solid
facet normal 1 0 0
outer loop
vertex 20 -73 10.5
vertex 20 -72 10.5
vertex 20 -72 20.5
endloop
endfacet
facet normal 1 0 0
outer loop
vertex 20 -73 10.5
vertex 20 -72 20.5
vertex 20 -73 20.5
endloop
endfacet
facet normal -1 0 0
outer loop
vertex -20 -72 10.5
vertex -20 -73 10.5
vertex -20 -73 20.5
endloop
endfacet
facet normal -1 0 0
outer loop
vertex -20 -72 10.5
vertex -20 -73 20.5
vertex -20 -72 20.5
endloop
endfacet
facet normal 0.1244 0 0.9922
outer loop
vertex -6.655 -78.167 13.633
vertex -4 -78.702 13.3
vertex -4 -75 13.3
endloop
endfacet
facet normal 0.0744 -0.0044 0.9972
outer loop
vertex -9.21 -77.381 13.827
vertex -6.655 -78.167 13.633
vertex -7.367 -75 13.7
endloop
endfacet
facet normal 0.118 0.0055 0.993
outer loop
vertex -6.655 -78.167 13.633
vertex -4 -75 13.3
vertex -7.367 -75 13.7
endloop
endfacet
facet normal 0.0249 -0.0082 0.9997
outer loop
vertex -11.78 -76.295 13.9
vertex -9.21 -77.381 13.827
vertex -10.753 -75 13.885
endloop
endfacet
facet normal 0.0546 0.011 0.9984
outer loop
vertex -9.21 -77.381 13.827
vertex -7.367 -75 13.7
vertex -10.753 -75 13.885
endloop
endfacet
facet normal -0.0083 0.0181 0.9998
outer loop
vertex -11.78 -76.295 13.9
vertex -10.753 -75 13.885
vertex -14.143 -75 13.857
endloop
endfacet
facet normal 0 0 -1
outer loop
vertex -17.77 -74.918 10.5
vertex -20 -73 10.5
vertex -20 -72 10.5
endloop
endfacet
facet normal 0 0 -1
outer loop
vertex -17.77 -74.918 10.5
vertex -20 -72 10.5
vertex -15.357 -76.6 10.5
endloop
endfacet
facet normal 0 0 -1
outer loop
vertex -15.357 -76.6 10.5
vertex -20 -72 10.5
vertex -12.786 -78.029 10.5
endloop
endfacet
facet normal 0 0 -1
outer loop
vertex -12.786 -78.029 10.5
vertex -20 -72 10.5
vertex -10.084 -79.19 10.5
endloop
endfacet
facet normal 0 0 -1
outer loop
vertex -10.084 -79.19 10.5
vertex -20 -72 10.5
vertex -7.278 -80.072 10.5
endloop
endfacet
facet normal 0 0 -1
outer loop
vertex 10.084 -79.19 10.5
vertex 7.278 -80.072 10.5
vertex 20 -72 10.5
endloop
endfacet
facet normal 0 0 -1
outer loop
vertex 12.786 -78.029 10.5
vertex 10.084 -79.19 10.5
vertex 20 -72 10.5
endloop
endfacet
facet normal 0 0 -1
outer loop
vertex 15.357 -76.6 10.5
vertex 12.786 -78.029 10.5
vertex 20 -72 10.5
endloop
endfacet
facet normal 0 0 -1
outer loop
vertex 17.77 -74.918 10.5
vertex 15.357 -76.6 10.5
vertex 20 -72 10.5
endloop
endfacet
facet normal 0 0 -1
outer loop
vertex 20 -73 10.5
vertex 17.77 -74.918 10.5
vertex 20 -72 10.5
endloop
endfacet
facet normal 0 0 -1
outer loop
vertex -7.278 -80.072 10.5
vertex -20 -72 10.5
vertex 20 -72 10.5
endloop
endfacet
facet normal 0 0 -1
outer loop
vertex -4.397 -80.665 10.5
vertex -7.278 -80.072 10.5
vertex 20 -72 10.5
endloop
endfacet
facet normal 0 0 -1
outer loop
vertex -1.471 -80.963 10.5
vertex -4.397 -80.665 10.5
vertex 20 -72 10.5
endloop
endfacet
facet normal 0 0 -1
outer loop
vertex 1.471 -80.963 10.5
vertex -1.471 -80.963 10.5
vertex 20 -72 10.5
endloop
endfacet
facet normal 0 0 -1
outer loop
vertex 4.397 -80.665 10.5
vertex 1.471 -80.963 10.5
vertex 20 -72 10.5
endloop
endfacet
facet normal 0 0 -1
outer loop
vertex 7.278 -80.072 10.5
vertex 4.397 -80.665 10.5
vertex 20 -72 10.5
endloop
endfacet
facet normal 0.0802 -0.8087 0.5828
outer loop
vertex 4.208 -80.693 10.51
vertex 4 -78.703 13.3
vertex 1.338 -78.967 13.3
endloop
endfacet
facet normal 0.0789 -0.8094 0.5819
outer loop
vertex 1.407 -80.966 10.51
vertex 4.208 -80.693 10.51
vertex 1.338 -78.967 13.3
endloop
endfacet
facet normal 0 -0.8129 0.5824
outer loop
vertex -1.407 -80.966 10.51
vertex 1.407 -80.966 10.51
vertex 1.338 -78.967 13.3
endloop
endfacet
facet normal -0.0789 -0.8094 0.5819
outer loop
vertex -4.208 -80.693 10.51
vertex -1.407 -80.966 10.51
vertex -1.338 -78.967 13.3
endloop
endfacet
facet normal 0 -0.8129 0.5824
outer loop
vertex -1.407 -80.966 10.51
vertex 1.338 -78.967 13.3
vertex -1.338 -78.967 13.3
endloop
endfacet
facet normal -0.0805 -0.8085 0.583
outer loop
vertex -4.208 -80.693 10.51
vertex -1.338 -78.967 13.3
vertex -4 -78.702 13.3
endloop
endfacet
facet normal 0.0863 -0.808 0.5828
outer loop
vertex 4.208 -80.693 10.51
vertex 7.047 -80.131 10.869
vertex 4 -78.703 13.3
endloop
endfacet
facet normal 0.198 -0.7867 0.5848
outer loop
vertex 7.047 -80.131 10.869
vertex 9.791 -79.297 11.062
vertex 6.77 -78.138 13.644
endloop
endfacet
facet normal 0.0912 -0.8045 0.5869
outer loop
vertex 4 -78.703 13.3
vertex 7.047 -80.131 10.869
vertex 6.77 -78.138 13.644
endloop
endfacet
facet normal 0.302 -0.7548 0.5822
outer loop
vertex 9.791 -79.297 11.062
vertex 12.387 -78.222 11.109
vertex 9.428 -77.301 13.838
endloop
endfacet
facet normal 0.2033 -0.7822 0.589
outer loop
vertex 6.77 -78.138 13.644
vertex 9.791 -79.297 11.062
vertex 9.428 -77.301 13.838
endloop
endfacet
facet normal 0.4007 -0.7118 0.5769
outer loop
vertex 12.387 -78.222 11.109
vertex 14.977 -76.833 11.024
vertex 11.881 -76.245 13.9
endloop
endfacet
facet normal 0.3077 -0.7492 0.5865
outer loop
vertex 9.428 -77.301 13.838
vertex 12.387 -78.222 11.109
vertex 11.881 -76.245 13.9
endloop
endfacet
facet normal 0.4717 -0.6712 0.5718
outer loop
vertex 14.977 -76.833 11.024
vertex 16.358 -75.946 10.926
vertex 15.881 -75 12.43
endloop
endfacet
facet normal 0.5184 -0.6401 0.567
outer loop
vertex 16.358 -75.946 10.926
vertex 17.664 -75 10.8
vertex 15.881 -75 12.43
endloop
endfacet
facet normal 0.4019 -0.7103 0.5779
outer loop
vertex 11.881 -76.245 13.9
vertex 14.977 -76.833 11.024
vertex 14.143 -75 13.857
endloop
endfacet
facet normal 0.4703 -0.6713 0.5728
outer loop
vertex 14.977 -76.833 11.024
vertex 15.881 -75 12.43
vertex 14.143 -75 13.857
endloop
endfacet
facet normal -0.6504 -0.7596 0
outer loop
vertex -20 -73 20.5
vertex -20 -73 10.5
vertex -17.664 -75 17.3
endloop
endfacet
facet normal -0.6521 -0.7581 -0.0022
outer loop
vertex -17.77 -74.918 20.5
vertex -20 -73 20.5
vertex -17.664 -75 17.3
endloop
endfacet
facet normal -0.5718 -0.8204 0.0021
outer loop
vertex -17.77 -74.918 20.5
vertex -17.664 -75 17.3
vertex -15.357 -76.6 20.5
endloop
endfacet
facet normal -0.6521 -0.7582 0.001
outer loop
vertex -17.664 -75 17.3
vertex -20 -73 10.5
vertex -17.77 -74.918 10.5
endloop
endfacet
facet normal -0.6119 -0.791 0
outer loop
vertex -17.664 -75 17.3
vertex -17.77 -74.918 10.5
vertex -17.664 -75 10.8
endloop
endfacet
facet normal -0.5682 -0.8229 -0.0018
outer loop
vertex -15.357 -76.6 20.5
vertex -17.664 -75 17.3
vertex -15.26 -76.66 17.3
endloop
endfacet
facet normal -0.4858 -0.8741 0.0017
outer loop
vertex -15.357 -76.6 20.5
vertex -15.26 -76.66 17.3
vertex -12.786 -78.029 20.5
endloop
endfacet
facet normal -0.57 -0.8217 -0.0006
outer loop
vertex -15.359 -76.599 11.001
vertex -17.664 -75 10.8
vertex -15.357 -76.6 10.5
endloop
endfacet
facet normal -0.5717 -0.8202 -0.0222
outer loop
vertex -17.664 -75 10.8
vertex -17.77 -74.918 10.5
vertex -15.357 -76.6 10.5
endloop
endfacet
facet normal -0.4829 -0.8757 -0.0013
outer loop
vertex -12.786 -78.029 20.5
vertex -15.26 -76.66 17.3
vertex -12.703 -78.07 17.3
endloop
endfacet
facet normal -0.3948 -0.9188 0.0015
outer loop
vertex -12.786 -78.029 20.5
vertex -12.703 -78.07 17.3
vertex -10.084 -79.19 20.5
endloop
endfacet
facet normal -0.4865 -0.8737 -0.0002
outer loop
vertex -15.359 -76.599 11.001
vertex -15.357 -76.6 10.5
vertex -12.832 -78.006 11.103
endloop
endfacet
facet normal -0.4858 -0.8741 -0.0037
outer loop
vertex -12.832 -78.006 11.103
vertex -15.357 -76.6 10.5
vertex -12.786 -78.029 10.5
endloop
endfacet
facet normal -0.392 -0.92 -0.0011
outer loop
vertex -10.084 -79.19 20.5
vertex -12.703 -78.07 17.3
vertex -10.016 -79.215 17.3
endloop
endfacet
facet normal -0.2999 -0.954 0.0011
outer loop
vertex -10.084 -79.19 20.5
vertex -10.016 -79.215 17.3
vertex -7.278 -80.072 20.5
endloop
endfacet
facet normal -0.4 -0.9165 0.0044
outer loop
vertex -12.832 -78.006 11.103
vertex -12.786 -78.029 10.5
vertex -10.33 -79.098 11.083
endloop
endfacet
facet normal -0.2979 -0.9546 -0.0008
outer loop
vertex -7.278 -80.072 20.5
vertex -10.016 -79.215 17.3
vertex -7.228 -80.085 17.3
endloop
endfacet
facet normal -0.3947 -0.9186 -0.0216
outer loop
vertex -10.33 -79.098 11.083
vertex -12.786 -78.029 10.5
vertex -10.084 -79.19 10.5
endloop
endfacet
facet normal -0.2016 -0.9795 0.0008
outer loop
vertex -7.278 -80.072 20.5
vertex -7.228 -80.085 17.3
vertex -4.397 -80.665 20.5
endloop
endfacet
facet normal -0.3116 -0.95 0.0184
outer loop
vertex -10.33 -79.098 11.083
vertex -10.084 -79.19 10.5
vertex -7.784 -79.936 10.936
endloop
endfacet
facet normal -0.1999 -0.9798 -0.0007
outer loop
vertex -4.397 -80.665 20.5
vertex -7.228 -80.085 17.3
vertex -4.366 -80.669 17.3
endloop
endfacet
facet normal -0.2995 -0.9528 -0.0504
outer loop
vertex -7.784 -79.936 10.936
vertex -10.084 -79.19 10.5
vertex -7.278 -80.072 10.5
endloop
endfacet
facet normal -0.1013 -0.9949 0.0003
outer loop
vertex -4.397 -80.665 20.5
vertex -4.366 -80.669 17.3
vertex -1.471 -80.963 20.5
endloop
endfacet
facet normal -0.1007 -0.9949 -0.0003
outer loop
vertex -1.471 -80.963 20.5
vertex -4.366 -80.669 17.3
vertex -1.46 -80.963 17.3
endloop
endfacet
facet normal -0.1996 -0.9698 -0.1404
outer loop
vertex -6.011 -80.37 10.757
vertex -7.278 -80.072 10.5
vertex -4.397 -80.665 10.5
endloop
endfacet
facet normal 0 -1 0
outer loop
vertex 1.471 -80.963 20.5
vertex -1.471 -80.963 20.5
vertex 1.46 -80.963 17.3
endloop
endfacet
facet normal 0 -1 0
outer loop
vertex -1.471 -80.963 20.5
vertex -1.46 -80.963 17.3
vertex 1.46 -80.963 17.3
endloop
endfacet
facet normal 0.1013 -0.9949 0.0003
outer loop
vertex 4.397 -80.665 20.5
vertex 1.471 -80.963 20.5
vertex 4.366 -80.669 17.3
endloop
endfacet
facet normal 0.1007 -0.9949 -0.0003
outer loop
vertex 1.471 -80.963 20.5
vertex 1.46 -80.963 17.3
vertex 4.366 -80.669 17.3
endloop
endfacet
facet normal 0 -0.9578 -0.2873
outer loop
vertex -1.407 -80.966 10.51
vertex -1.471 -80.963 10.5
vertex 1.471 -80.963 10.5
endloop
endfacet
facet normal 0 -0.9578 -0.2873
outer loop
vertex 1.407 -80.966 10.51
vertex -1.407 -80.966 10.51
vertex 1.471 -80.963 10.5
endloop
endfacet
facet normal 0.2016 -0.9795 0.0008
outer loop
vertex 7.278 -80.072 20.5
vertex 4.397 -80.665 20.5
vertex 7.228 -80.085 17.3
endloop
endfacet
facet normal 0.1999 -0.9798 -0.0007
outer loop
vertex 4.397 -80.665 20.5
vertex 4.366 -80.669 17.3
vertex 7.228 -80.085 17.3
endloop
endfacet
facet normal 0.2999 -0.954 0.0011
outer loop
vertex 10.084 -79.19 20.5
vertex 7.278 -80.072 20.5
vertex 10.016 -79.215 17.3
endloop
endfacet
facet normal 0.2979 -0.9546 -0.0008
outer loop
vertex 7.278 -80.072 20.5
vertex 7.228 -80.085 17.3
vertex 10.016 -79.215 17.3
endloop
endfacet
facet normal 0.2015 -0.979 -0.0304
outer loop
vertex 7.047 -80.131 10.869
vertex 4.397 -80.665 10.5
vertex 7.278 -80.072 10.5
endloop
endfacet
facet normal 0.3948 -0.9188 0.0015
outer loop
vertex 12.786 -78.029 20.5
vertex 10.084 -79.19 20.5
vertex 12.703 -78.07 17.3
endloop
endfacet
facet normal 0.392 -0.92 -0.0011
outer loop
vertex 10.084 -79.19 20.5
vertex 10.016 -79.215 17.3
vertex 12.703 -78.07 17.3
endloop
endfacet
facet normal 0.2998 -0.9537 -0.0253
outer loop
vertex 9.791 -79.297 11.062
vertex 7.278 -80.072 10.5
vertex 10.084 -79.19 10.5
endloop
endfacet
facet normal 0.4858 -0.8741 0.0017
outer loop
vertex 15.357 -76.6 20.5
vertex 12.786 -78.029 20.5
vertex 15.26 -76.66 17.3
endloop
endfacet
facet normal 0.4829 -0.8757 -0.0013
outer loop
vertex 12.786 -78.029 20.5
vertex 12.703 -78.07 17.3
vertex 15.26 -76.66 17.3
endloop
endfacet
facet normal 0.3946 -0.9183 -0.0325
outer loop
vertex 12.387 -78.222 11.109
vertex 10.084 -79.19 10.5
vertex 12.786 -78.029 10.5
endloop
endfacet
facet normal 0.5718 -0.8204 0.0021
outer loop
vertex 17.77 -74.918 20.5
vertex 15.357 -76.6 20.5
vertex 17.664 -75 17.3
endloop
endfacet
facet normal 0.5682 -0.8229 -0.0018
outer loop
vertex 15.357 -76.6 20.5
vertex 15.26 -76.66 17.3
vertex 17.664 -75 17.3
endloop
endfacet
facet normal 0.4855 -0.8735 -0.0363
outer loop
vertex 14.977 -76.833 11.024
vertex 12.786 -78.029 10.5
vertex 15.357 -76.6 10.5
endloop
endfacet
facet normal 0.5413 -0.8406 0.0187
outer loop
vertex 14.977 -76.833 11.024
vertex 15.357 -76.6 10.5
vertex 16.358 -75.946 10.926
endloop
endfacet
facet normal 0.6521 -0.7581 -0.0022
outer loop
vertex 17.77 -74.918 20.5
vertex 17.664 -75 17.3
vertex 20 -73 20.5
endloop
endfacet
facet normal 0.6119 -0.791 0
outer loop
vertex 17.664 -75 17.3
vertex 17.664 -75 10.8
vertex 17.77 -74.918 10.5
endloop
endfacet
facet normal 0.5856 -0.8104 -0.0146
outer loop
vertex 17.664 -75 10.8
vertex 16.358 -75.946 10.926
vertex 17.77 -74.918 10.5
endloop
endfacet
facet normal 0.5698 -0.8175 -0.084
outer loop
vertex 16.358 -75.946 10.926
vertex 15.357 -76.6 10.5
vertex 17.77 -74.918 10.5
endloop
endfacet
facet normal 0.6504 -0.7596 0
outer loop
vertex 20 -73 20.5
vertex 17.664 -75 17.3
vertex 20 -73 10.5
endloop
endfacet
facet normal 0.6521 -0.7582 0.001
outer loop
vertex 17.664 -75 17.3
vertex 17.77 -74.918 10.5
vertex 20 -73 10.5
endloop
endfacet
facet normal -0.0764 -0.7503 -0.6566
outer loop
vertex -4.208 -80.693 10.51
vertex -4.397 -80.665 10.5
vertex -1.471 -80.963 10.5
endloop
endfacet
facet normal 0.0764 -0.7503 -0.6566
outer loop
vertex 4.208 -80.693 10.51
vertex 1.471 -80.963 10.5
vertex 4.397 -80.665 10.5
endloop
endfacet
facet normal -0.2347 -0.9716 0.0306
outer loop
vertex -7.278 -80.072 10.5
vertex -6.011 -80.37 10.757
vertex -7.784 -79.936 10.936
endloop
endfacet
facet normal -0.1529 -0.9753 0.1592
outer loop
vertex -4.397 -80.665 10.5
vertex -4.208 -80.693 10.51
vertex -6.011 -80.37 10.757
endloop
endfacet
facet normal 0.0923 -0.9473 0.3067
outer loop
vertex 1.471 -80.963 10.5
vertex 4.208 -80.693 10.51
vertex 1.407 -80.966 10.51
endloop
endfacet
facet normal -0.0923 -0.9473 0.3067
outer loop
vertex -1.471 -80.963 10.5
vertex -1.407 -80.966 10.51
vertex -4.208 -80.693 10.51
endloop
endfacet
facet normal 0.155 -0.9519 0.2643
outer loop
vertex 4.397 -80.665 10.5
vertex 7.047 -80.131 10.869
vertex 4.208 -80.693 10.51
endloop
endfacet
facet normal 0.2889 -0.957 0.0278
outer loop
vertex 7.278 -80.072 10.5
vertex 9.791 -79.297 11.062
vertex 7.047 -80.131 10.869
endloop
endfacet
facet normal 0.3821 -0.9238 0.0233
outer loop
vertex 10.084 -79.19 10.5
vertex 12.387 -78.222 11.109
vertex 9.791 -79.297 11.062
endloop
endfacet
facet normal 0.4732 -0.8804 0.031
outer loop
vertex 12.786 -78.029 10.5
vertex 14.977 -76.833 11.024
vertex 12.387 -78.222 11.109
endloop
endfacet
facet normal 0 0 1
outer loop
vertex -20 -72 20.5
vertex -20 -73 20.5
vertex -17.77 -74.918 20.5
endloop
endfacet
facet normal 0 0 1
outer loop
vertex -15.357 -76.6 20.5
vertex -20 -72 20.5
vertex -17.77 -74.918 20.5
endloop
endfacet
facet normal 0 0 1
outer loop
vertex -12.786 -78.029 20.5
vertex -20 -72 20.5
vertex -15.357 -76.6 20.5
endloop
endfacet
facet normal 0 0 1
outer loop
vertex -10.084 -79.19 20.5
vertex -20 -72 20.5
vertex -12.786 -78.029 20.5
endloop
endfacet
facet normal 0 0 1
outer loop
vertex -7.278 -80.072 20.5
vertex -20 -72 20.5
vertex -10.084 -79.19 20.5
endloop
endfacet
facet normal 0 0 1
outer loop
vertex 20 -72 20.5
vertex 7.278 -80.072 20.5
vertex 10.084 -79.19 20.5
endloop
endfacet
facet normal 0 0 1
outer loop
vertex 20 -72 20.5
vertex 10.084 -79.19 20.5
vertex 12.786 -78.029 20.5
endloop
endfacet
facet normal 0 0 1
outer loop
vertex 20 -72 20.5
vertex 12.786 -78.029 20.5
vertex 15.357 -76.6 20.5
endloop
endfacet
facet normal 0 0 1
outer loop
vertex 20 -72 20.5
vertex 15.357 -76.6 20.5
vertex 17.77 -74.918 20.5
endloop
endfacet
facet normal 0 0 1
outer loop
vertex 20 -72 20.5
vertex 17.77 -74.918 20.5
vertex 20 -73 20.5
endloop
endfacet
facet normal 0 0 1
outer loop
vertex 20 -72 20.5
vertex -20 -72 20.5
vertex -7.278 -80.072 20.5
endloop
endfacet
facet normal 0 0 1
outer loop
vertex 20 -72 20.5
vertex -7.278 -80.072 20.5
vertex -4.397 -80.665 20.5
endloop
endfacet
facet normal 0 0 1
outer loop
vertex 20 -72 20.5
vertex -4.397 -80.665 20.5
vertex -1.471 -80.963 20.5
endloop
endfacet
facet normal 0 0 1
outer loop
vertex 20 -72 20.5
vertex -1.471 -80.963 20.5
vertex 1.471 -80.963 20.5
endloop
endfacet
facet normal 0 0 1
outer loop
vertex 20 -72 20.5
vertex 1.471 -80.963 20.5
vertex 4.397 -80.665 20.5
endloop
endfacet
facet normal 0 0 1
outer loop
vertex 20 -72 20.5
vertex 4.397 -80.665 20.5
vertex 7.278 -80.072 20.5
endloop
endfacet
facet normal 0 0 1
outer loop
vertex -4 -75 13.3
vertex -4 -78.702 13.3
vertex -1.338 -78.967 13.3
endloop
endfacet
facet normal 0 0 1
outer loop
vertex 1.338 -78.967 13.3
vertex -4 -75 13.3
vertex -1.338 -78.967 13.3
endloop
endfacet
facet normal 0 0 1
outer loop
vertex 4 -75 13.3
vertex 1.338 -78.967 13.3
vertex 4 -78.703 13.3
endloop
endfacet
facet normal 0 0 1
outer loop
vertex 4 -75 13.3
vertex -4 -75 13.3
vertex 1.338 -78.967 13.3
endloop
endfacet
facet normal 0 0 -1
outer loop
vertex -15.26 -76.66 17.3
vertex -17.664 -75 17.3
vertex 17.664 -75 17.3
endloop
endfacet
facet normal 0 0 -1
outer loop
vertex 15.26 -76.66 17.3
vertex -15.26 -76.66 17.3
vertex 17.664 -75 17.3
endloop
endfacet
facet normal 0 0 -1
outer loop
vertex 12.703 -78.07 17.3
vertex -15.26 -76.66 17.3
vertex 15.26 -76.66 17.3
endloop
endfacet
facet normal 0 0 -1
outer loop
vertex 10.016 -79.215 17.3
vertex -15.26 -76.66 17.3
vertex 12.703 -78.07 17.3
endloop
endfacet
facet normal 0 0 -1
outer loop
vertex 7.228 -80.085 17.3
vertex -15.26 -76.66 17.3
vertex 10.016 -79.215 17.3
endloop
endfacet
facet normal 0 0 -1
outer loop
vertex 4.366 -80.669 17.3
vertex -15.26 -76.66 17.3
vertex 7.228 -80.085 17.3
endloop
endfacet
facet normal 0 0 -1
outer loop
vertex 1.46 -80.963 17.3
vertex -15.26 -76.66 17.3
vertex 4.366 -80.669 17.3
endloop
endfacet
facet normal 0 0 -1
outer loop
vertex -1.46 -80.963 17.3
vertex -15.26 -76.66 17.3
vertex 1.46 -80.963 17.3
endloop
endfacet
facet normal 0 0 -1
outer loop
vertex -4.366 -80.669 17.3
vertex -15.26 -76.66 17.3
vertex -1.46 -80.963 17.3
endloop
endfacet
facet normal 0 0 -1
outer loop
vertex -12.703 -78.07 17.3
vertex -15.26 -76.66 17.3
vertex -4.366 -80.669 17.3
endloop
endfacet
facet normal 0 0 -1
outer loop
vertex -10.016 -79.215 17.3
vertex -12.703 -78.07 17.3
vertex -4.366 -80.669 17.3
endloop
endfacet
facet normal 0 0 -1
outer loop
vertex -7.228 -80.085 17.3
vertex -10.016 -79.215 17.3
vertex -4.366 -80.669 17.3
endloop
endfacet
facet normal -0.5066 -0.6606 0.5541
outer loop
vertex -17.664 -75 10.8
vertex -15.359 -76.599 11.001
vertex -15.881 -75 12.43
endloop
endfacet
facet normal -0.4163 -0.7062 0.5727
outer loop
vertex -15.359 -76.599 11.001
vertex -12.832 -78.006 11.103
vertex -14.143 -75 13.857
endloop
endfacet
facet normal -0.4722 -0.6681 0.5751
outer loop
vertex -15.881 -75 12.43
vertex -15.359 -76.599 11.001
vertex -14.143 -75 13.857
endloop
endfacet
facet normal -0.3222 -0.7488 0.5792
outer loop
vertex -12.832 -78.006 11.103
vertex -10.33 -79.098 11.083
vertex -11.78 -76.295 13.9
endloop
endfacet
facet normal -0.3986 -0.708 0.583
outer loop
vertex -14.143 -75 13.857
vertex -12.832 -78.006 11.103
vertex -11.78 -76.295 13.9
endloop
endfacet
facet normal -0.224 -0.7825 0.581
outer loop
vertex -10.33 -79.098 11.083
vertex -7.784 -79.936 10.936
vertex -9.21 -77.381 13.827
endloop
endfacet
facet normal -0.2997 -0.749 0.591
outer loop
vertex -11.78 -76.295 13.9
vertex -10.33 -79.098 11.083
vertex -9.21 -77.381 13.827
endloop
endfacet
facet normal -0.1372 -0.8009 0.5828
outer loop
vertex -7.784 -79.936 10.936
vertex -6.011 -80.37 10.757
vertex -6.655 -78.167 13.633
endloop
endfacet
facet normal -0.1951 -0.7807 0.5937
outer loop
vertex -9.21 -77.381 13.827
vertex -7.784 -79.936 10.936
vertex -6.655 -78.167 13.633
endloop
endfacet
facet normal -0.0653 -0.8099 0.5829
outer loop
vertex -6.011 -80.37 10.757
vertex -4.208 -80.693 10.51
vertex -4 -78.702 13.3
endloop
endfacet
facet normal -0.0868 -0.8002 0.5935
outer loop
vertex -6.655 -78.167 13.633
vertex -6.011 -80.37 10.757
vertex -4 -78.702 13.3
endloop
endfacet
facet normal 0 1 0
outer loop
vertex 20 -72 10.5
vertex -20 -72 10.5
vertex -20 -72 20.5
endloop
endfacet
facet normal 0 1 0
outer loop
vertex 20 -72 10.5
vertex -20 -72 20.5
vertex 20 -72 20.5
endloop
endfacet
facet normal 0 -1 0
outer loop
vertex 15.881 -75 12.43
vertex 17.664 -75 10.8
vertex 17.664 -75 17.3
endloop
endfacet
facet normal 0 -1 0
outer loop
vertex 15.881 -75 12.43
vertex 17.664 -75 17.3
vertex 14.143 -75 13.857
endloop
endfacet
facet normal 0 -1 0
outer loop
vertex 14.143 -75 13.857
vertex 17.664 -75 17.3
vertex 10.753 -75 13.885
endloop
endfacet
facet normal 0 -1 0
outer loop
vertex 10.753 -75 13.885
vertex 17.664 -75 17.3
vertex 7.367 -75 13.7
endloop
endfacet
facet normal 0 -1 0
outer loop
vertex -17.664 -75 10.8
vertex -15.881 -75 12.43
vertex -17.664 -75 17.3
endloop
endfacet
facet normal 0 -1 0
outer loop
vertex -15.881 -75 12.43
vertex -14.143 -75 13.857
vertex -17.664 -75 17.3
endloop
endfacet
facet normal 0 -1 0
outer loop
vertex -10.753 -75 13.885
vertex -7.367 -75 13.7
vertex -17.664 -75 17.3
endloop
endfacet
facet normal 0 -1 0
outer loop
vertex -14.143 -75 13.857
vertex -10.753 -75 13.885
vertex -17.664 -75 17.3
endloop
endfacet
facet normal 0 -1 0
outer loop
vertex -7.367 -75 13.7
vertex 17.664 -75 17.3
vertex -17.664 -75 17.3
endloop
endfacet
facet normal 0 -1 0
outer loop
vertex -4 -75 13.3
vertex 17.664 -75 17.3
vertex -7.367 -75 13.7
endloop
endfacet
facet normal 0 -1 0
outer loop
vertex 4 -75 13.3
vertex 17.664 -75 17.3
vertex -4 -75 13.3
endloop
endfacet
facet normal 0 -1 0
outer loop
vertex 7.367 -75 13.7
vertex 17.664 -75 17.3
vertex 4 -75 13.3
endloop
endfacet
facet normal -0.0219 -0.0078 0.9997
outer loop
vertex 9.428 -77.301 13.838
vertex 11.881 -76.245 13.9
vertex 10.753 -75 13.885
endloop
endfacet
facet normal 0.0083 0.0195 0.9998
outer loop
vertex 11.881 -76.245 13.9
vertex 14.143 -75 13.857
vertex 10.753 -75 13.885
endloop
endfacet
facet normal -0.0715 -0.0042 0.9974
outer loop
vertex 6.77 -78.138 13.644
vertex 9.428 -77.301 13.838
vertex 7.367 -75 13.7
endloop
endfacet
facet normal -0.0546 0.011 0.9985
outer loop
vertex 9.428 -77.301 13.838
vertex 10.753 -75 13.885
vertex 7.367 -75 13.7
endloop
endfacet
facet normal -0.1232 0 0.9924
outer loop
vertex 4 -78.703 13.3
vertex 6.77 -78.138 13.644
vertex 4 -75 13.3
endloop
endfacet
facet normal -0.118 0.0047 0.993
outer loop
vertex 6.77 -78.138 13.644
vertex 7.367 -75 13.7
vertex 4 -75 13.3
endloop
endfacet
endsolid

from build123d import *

# Parameters (mm, degrees)
PAD003_DEPTH    = 10
POCKET009_DEPTH = 6.001
CHAMFER_SIZE2   = 2
CHAMFER_SIZE    = 2.79


with BuildPart() as part:
    # Sketch036 → Pad003 (new body)
    with BuildSketch(Plane.XY):
        with BuildLine():
            ThreePointArc((-20, -1), (0, -9), (20, -1))
            Line((20, 0), (20, -1))
            Line((-20, 0), (20, 0))
            Line((-20, -1), (-20, 0))
        make_face()
    extrude(amount=PAD003_DEPTH)

    # Sketch037 (on DatumPlane) → Pocket009 (cut, through all)
    with BuildSketch(Plane.XZ.offset(3)):
        with BuildLine():
            Line((-20, 6.8), (20, 6.8))
            Line((20, 6.8), (20, 2.8))
            ThreePointArc((20, 2.8), (12, 3.4), (4, 2.8))
            Line((-4, 2.8), (4, 2.8))
            ThreePointArc((-4, 2.8), (-12, 3.4), (-20, 2.8))
            Line((-20, 2.8), (-20, 6.8))
        make_face()
    extrude(amount=POCKET009_DEPTH, mode=Mode.SUBTRACT)

    # Chamfer
    chamfer_edges = [part.edges().sort_by_distance(p)[0] for p in [
        (11.193894, -6.752509, 3.393942),
        (0, -9, 2.8),
        (-11.193894, -6.752509, 3.393942),
    ]]
    chamfer_side = part.faces().sort_by_distance((0, -9, 0.42))[0]
    chamfer(chamfer_edges, length=CHAMFER_SIZE, length2=CHAMFER_SIZE2, reference=chamfer_side)


with BuildPart() as part_1:
    # Body003 placement: moved
    add(part.part.moved(Location((0, -72, 10.5))))


solid = part_1.part
